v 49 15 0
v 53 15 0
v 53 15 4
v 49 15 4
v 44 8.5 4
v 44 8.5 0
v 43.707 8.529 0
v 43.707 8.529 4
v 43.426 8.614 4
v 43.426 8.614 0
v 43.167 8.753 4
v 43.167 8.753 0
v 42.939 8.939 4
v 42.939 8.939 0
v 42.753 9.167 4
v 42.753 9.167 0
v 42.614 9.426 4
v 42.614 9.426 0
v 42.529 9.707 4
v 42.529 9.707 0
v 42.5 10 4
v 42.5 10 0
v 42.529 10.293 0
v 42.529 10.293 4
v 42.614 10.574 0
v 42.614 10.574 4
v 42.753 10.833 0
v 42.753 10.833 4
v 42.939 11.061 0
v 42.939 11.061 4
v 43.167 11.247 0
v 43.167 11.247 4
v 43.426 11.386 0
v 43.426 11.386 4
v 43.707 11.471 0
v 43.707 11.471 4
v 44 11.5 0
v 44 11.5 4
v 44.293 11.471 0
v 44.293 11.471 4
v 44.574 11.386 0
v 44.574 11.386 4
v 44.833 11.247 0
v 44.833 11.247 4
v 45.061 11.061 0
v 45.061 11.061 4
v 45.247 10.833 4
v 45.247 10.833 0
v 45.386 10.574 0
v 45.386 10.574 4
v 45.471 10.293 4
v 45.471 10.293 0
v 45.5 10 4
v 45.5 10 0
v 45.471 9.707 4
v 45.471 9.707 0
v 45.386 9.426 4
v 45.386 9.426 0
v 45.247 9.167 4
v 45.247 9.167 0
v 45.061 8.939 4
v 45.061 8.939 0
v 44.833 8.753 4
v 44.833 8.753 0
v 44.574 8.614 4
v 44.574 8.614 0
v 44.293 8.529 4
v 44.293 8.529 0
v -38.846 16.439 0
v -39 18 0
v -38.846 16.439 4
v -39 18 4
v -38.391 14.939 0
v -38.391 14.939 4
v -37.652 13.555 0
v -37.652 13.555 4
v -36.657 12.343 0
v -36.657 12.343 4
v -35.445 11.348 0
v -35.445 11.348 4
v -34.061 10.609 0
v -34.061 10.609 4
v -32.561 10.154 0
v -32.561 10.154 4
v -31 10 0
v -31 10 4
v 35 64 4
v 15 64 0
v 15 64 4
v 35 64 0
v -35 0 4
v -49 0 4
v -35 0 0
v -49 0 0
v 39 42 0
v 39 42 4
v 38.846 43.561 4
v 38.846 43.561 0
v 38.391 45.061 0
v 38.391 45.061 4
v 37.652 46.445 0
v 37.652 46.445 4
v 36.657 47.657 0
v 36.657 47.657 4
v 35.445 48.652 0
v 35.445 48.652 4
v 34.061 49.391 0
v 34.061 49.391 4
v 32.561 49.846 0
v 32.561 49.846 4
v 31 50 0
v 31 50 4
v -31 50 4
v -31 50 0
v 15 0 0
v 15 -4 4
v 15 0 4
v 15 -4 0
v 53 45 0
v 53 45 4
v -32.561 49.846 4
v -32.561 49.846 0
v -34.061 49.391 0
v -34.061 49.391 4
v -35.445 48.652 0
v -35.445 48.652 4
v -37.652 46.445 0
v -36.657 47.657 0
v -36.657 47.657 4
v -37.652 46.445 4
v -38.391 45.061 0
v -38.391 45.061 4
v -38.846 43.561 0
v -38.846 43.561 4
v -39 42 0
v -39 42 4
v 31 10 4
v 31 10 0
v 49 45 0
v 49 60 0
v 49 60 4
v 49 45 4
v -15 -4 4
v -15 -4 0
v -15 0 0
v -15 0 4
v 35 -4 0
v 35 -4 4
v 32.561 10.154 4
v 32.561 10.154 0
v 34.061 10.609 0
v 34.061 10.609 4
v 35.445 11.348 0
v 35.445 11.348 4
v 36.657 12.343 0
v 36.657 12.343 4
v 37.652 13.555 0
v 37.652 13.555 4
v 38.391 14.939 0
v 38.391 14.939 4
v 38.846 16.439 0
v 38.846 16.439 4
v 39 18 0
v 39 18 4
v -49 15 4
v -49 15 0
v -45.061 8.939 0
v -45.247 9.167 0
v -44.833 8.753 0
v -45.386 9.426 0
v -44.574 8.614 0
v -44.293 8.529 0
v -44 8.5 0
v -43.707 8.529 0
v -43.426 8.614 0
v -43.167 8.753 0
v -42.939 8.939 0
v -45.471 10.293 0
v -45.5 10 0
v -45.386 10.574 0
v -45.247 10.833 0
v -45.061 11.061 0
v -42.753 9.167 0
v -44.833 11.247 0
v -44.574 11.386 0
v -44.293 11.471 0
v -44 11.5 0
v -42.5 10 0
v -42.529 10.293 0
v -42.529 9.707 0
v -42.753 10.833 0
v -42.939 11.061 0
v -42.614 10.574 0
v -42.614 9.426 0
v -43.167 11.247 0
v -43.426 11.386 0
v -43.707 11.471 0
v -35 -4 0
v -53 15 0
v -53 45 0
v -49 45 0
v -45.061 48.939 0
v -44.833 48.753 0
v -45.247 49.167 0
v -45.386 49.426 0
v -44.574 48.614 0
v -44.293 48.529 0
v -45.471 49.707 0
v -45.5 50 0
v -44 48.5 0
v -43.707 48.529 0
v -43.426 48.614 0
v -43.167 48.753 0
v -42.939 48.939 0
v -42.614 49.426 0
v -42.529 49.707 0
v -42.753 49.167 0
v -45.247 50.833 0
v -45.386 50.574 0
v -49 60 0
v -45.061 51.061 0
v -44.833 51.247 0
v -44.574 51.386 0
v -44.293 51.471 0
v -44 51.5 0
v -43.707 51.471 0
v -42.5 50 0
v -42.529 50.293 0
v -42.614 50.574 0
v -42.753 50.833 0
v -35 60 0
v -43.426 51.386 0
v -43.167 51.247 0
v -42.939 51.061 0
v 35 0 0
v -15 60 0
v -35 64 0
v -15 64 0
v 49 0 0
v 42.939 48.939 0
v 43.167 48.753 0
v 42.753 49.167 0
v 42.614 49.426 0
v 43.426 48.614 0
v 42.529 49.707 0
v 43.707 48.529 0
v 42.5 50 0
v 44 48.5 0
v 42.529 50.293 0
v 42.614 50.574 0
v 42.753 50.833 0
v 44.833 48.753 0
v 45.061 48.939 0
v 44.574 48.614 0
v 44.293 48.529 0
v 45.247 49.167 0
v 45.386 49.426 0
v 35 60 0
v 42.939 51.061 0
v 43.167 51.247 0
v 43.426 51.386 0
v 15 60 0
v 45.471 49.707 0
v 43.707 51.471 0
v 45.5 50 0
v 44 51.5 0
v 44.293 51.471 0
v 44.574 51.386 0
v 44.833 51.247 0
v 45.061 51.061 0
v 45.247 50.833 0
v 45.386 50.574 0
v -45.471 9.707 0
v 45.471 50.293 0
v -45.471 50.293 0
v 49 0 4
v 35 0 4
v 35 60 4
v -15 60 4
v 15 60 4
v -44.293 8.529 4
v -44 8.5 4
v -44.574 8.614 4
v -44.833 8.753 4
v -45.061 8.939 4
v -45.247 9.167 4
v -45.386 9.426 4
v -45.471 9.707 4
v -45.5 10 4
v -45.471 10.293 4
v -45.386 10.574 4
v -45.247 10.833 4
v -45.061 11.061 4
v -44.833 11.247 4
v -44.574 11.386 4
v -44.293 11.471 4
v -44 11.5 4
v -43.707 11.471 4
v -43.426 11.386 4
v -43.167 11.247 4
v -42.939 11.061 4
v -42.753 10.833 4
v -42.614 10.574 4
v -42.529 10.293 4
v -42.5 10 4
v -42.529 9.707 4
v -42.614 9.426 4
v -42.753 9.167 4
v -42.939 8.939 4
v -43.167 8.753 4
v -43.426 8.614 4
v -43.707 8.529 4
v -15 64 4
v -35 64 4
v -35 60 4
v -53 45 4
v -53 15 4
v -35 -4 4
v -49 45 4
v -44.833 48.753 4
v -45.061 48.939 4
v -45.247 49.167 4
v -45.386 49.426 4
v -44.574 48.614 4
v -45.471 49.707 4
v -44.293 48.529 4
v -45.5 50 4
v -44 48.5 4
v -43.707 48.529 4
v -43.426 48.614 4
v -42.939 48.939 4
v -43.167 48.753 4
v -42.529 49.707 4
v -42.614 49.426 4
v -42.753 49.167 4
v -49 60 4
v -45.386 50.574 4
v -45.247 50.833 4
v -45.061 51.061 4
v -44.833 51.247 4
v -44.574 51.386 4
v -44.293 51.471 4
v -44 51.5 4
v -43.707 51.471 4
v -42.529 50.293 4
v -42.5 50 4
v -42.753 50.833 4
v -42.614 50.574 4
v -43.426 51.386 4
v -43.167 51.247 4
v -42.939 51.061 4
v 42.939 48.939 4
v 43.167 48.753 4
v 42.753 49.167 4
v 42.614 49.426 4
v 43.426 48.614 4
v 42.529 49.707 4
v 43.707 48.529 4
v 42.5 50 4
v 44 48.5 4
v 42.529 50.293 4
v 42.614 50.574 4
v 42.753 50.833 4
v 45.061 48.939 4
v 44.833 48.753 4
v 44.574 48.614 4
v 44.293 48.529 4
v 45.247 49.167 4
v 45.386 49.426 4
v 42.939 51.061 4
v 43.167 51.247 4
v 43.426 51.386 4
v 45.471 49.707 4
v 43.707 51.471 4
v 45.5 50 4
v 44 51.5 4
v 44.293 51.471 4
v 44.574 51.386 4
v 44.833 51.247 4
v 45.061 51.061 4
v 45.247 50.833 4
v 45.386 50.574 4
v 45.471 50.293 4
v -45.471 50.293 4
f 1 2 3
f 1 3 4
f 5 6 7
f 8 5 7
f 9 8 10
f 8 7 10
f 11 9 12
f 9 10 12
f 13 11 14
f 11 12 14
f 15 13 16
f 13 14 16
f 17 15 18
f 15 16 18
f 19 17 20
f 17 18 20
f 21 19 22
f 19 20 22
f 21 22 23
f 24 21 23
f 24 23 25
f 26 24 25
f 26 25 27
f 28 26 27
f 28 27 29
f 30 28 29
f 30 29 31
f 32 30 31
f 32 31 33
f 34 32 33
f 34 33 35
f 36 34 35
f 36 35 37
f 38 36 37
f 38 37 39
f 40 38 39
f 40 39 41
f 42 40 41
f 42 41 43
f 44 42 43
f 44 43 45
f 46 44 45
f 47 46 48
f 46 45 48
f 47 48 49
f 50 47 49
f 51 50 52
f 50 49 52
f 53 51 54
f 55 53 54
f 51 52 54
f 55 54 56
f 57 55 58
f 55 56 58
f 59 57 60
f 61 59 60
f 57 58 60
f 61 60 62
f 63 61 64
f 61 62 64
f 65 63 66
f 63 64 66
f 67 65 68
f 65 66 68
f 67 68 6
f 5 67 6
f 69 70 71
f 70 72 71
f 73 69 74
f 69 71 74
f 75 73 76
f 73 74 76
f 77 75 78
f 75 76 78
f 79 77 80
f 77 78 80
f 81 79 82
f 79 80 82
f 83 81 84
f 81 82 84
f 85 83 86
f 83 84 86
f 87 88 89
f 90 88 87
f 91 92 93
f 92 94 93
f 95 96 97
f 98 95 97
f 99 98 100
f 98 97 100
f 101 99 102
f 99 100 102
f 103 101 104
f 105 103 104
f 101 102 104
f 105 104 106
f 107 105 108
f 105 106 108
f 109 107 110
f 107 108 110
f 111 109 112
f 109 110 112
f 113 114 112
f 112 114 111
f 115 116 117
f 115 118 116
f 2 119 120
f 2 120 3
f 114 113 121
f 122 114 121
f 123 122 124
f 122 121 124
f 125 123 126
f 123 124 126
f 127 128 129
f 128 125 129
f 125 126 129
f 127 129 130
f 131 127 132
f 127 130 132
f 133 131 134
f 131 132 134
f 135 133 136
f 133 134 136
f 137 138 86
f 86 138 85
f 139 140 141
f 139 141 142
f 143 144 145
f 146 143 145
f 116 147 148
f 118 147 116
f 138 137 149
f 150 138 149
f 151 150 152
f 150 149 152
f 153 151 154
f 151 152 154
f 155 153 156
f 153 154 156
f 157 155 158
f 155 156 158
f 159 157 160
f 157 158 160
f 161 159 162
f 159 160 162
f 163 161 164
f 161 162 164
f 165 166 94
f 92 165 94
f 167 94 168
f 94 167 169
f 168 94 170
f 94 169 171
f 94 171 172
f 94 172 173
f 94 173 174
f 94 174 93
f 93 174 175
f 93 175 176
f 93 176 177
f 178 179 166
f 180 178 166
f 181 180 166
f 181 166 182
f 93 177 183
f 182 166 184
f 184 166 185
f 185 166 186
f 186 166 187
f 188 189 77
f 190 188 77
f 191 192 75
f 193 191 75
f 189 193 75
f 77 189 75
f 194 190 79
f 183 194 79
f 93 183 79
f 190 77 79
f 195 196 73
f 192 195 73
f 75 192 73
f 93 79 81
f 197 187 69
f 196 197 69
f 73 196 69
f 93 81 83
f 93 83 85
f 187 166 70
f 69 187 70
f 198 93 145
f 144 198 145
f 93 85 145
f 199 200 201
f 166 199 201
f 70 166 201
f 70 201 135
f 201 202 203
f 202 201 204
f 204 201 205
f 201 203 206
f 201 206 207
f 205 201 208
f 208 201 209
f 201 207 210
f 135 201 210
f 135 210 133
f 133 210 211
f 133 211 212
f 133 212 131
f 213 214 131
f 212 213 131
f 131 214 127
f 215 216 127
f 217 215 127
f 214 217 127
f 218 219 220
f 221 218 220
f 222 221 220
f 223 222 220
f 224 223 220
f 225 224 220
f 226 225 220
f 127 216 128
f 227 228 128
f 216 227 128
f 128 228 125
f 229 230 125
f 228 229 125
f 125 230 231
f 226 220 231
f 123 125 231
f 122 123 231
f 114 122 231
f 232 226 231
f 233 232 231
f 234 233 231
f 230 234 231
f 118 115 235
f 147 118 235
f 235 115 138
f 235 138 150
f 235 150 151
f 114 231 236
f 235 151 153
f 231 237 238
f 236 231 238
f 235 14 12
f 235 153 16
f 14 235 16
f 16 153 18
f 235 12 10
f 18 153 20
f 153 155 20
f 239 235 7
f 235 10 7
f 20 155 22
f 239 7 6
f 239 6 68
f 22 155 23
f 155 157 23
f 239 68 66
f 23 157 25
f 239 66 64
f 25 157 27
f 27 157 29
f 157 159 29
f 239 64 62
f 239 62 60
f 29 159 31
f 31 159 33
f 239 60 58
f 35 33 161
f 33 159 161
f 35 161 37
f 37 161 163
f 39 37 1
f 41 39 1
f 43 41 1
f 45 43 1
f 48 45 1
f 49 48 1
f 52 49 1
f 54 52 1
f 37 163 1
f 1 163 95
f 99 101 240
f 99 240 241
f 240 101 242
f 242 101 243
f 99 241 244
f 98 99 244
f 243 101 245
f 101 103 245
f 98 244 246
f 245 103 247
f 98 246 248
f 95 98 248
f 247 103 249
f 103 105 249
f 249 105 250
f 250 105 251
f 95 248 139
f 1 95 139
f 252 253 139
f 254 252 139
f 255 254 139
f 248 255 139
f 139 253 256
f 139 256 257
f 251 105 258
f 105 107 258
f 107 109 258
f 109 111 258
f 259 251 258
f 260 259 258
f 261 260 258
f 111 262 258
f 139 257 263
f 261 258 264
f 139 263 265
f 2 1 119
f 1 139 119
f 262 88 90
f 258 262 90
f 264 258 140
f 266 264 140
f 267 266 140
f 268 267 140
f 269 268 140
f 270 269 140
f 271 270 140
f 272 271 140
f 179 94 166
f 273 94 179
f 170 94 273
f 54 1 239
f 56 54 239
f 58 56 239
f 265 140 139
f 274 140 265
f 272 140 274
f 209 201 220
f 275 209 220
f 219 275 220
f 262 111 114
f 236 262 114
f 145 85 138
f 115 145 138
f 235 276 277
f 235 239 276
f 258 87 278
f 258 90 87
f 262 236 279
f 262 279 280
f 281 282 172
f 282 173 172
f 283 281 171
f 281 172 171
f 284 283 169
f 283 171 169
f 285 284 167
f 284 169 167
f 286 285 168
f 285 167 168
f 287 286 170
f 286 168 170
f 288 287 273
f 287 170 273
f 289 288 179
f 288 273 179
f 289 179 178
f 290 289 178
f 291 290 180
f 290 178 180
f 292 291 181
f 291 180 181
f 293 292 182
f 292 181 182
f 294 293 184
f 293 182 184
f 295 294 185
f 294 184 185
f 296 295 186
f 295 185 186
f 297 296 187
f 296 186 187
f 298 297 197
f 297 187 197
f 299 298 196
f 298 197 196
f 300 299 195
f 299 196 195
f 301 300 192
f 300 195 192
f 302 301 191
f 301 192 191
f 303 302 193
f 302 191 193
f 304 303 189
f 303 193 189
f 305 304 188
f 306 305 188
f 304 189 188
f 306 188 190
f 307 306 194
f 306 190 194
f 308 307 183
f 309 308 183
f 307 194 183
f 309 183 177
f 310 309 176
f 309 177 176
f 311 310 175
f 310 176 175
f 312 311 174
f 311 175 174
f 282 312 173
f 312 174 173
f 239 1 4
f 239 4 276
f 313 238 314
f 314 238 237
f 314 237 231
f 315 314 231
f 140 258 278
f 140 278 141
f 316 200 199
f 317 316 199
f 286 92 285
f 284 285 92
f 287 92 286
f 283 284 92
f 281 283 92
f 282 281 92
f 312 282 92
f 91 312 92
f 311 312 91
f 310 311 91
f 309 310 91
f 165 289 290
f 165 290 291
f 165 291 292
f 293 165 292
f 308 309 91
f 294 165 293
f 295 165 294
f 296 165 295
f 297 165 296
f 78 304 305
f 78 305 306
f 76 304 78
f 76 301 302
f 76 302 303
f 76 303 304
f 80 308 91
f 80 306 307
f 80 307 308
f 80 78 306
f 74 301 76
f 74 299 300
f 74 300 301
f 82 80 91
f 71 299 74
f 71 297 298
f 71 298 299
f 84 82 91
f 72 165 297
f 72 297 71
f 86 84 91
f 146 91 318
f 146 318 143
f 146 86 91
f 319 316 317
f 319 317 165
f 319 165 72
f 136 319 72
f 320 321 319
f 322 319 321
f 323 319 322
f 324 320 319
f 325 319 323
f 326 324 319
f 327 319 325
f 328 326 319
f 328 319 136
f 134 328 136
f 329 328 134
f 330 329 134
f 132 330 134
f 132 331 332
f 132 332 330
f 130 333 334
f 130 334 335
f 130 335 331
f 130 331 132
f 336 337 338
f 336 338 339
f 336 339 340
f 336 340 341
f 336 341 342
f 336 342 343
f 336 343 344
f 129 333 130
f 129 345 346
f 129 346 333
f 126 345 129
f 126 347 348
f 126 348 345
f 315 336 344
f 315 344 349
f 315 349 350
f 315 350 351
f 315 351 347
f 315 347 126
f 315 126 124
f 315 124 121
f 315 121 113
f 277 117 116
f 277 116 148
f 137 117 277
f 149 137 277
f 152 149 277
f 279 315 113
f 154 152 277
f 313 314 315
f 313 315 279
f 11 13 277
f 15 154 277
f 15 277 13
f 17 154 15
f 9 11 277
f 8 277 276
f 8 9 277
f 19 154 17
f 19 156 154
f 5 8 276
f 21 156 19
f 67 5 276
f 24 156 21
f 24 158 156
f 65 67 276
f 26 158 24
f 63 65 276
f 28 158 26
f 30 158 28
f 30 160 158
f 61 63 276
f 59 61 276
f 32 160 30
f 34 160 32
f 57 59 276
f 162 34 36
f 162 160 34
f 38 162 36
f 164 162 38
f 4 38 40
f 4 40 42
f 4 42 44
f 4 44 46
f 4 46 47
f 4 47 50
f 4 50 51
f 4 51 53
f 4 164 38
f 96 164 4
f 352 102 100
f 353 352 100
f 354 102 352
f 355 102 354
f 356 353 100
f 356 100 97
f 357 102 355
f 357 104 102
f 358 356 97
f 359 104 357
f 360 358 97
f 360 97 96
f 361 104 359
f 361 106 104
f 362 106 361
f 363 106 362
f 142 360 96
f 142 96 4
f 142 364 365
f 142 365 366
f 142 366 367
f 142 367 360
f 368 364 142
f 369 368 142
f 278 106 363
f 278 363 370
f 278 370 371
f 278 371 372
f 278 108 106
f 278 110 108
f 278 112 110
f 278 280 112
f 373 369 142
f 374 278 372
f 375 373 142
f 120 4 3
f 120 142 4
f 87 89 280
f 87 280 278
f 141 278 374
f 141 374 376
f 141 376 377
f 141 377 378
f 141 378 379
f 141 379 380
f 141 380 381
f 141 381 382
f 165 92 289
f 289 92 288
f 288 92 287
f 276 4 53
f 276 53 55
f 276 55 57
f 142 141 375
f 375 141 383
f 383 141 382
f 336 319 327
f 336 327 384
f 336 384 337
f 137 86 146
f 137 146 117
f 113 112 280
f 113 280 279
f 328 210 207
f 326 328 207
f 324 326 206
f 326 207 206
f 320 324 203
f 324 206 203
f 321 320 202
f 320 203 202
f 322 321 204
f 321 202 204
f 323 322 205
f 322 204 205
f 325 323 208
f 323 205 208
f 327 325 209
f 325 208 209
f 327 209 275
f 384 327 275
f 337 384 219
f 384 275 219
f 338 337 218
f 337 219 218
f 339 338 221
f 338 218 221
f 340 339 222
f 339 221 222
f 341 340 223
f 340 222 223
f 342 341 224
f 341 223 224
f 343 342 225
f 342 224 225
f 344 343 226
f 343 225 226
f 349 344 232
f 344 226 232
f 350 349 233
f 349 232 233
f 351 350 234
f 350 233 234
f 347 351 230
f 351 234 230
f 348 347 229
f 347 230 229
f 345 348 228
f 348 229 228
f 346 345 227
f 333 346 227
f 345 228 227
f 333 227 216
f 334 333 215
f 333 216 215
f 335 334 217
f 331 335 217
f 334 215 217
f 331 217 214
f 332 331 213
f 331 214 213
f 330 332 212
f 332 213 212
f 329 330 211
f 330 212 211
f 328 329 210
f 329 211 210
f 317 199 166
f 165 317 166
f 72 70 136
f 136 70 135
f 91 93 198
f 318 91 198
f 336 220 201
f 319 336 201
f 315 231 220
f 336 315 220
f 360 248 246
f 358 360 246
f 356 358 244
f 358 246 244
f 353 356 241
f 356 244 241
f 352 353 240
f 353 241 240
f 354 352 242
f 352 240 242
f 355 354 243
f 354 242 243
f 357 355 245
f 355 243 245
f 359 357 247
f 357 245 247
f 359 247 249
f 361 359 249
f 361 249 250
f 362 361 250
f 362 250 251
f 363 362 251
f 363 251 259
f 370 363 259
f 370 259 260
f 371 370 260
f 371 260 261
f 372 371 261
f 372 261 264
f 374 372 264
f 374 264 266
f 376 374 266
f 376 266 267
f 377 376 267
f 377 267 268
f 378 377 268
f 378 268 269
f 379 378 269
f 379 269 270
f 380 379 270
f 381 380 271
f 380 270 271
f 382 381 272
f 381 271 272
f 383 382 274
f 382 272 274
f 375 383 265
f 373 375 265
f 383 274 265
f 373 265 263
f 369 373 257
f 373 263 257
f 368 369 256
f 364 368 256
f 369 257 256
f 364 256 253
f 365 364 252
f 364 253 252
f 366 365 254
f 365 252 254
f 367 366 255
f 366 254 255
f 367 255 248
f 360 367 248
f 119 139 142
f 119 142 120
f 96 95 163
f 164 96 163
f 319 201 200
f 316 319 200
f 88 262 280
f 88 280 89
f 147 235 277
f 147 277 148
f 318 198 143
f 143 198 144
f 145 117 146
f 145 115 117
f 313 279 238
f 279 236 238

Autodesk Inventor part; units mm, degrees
ref_plane "YZ Plane" through (0, 0, 0) normal (1, 0, 0) x (0, 1, 0)
ref_plane "XZ Plane" through (0, 0, 0) normal (0, 1, 0) x (-1, 0, 0)
ref_plane "XY Plane" through (0, 0, 0) normal (0, 0, 1) x (1, 0, 0)
sketch "Эскиз1" plane through (0, 0, 0) normal (0, 0, 1) x (1, 0, 0)
  line L0 (0, 0) -> (0, 60) construction
  line L1 (0, 60) -> (-15, 60)
  line L2 (-15, 60) -> (-15, 64)
  line L3 (-15, 64) -> (-35, 64)
  line L4 (-35, 64) -> (-35, 60)
  line L5 (-35, 60) -> (-49, 60)
  line L6 (-49, 60) -> (-49, 45)
  line L7 (-49, 45) -> (-53, 45)
  line L8 (-53, 45) -> (-53, 15)
  line L9 (-53, 15) -> (-49, 15)
  line L10 (-49, 15) -> (-49, 0)
  line L11 (-49, 0) -> (-35, 0)
  line L12 (-35, 0) -> (-35, -4)
  line L13 (-35, -4) -> (-15, -4)
  line L14 (-15, -4) -> (-15, 0)
  line L15 (-15, 0) -> (0, 0)
  line L16 (0, 60) -> (15, 60)
  line L17 (15, 60) -> (15, 64)
  line L18 (15, 64) -> (35, 64)
  line L19 (35, 64) -> (35, 60)
  line L20 (35, 60) -> (49, 60)
  line L21 (49, 60) -> (49, 45)
  line L22 (49, 45) -> (53, 45)
  line L23 (53, 45) -> (53, 15)
  line L24 (53, 15) -> (49, 15)
  line L25 (49, 15) -> (49, 0)
  line L26 (49, 0) -> (35, 0)
  line L27 (35, 0) -> (35, -4)
  line L28 (35, -4) -> (15, -4)
  line L29 (15, -4) -> (15, 0)
  line L30 (15, 0) -> (0, 0)
  line L31 (-39, 50) -> (39, 50)
  line L32 (39, 50) -> (39, 10)
  line L33 (39, 10) -> (-39, 10)
  line L34 (-39, 10) -> (-39, 50)
  point P0 (-53, 30)
  point P1 (0, 30)
  point P2 (53, 30)
  dimension "d0" = 30
  dimension "d1" = 4
  dimension "d2" = 98
  dimension "d3" = 30
  dimension "d4" = 20
  dimension "d5" = 60
  dimension "d6" = 10
  dimension "d7" = 10
  dimension "d8" = 10
extrude "Выдавливание1" add sketch "Эскиз1" along normal blind 4
fillet "Сопряжение1" radius 8 4 edges at (-39, 10, 2) (-39, 50, 2) (39, 50, 2) (39, 10, 2)
sketch "Эскиз2" plane through (0, 0, 4) normal (0, 0, 1) x (1, 0, 0)
  line L0 (0, 0) -> (0, 60)
  line L1 (-15, 60) -> (15, 60) projected
  line L2 (-35, 60) -> (-49, 60) projected
  line L3 (-49, 0) -> (-35, 0) projected
  line L4 (-49, 60) -> (-49, 45) projected
  point P0 (44, 10)
  point P1 (44, 50)
  point P2 (-44, 10)
  point P3 (-44, 50)
  dimension "d19" = 10
  dimension "d20" = 10
  dimension "d21" = 5
hole "Отверстие1" at (44, 10, 4) at (44, 50, 4) at (-44, 10, 4) at (-44, 50, 4) direction (0, 0, -1) diameter 3 end through all
properties part number "stiffenerFront" material "Дерево (береза)"
